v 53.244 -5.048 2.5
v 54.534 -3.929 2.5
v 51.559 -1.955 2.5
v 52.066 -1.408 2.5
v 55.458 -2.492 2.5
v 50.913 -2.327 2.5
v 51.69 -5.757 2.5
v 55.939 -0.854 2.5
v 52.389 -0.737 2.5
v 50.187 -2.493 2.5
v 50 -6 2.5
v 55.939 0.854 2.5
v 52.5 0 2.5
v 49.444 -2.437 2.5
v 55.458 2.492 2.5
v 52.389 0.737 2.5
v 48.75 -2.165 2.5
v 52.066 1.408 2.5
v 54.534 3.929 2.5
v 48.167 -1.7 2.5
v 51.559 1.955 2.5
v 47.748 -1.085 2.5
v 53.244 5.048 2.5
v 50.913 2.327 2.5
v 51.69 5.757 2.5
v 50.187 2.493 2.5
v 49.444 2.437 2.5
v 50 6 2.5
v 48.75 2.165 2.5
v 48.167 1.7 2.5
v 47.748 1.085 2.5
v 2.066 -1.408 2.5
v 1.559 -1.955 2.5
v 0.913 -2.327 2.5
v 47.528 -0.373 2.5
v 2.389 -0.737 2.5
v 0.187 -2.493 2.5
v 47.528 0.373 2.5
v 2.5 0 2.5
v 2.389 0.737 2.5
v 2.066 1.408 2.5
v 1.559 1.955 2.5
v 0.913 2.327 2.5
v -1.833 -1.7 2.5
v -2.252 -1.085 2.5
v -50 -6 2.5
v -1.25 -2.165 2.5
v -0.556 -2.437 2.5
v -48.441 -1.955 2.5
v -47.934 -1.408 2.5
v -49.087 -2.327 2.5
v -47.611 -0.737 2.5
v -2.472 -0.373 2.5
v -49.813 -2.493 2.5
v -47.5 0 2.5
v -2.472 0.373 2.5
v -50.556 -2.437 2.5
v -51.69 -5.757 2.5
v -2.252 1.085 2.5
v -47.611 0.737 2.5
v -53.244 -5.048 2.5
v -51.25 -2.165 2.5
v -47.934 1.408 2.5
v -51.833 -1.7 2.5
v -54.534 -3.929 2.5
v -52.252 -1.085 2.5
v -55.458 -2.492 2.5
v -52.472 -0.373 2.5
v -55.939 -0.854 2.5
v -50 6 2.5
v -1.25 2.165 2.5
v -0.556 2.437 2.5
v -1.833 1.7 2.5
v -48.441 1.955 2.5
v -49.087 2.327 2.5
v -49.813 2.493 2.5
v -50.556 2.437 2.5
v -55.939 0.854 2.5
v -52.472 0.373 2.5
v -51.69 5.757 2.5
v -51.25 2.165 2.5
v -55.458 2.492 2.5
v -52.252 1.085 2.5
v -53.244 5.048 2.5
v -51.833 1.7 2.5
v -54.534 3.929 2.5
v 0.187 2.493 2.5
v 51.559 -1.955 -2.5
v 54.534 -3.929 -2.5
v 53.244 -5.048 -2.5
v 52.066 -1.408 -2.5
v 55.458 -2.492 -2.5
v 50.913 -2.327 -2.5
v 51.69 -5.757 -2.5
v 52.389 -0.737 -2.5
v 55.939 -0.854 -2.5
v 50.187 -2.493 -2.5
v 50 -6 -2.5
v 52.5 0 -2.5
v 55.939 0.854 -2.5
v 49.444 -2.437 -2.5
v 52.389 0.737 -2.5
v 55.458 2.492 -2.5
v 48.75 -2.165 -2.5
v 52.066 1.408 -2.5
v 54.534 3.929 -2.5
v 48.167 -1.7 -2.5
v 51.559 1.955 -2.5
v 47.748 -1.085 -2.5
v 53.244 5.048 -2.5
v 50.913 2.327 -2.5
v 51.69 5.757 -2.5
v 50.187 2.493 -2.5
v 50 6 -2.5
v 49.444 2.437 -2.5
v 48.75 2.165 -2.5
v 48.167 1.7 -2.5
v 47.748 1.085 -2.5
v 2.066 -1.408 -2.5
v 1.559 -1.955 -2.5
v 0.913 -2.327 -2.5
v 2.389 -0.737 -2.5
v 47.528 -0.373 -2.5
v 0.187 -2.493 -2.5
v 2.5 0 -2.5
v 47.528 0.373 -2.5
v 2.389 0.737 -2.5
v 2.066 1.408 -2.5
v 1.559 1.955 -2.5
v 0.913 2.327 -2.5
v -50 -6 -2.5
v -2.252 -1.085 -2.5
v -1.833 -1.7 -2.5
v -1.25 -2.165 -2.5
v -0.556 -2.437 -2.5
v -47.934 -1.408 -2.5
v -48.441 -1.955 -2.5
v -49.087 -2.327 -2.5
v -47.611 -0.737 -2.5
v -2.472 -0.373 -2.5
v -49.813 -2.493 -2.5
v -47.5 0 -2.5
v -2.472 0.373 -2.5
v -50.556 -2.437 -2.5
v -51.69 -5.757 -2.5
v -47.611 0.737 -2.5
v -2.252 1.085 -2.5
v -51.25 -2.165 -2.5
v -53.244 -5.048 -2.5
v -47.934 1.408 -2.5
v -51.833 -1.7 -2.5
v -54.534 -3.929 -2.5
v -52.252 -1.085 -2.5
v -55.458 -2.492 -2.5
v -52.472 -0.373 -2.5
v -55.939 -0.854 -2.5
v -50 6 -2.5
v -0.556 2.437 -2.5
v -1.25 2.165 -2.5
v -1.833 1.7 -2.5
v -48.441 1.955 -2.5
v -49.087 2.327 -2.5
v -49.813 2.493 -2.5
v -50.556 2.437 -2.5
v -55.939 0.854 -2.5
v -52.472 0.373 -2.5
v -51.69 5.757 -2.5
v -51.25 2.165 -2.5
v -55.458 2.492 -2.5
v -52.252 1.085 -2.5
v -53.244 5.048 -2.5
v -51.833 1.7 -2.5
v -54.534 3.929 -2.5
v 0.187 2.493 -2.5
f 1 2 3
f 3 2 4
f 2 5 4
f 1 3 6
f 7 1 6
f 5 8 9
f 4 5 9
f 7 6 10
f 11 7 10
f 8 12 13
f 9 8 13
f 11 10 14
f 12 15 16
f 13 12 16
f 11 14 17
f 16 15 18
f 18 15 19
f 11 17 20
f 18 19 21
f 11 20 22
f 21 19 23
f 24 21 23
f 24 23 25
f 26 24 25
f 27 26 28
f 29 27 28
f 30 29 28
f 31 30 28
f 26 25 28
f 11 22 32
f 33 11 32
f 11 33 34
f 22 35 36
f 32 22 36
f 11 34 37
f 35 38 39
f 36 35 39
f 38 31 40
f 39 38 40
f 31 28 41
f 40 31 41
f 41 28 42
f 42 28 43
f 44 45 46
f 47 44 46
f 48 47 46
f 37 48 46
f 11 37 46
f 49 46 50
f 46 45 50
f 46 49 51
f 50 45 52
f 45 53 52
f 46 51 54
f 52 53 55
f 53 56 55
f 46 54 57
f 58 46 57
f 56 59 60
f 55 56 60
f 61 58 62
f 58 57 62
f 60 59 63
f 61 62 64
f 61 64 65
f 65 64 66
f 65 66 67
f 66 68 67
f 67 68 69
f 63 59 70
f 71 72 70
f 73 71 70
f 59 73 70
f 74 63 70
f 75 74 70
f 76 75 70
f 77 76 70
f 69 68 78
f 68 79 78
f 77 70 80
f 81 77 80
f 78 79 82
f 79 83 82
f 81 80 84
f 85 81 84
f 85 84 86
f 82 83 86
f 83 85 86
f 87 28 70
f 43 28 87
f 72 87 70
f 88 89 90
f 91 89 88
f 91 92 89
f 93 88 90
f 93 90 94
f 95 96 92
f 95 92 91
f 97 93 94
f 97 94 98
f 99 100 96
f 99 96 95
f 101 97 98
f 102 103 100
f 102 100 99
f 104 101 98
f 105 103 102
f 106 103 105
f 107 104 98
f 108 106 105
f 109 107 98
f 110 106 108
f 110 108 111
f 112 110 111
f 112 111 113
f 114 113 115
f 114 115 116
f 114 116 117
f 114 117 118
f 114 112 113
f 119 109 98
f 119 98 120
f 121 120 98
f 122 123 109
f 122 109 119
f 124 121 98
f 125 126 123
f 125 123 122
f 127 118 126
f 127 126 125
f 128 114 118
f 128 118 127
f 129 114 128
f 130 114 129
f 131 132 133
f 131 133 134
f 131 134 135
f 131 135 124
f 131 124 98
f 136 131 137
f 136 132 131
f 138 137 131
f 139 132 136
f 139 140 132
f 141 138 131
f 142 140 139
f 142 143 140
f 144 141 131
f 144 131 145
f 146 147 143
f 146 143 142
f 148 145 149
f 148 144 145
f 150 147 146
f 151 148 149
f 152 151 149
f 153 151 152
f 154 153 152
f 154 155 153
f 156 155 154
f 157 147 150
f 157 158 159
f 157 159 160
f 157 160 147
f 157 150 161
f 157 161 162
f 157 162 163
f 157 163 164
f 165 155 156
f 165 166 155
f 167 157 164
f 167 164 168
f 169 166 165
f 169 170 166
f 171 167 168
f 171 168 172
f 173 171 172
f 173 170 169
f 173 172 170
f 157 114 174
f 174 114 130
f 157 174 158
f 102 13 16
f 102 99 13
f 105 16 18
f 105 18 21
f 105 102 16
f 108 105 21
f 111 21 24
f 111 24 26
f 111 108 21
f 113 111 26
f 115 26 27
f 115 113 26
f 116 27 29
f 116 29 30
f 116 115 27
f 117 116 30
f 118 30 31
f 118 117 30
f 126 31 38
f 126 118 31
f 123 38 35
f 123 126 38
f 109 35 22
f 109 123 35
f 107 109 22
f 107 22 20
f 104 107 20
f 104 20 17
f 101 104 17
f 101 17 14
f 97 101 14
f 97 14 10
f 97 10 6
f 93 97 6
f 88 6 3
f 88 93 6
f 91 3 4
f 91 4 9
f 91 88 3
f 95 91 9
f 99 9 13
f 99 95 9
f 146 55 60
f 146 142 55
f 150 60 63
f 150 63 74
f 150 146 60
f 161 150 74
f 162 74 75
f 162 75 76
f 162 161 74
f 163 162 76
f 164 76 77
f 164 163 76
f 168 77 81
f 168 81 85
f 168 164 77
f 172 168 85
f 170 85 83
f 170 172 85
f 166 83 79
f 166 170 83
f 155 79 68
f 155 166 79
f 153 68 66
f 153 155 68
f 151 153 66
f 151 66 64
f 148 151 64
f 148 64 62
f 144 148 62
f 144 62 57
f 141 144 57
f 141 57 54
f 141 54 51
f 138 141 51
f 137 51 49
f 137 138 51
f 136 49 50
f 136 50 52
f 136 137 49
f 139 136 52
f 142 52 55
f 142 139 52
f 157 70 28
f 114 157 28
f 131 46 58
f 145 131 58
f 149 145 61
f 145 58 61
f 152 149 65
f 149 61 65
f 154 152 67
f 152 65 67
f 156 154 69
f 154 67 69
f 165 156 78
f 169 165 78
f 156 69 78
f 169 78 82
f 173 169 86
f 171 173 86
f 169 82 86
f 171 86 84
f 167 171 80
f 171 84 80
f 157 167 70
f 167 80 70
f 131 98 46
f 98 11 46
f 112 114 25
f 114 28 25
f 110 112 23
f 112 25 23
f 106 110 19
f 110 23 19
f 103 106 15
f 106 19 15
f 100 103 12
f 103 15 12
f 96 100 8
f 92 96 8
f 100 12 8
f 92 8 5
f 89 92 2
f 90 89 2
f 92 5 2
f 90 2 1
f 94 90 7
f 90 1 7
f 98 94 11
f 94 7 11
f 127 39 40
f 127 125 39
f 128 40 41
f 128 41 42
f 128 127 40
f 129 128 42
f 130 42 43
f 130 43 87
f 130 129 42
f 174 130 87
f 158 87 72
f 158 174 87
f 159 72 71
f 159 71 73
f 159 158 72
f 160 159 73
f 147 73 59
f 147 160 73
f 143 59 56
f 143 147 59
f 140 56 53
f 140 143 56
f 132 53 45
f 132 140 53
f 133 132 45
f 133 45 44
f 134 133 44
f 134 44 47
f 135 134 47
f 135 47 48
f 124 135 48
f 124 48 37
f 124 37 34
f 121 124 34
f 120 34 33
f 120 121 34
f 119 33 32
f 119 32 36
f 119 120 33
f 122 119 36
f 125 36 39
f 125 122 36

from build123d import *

# Parameters (mm, degrees)
SKETCH1_R           = 2.5
BOSS_EXTRUDE1_DEPTH = 2.5


with BuildPart() as part:
    # Sketch1 → Boss-Extrude1 (new, symmetric)
    with BuildSketch(Plane.XY):
        with BuildLine():
            Line((-50, 6), (50, 6))
            ThreePointArc((50, 6), (56, 0), (50, -6))
            Line((50, -6), (-50, -6))
            ThreePointArc((-50, -6), (-56, 0), (-50, 6))
        make_face()
        with Locations((-50, 0)):
            Circle(SKETCH1_R, mode=Mode.SUBTRACT)
        with Locations((50, 0)):
            Circle(SKETCH1_R, mode=Mode.SUBTRACT)
        Circle(SKETCH1_R, mode=Mode.SUBTRACT)
    extrude(amount=BOSS_EXTRUDE1_DEPTH, both=True)


solid = part.part
